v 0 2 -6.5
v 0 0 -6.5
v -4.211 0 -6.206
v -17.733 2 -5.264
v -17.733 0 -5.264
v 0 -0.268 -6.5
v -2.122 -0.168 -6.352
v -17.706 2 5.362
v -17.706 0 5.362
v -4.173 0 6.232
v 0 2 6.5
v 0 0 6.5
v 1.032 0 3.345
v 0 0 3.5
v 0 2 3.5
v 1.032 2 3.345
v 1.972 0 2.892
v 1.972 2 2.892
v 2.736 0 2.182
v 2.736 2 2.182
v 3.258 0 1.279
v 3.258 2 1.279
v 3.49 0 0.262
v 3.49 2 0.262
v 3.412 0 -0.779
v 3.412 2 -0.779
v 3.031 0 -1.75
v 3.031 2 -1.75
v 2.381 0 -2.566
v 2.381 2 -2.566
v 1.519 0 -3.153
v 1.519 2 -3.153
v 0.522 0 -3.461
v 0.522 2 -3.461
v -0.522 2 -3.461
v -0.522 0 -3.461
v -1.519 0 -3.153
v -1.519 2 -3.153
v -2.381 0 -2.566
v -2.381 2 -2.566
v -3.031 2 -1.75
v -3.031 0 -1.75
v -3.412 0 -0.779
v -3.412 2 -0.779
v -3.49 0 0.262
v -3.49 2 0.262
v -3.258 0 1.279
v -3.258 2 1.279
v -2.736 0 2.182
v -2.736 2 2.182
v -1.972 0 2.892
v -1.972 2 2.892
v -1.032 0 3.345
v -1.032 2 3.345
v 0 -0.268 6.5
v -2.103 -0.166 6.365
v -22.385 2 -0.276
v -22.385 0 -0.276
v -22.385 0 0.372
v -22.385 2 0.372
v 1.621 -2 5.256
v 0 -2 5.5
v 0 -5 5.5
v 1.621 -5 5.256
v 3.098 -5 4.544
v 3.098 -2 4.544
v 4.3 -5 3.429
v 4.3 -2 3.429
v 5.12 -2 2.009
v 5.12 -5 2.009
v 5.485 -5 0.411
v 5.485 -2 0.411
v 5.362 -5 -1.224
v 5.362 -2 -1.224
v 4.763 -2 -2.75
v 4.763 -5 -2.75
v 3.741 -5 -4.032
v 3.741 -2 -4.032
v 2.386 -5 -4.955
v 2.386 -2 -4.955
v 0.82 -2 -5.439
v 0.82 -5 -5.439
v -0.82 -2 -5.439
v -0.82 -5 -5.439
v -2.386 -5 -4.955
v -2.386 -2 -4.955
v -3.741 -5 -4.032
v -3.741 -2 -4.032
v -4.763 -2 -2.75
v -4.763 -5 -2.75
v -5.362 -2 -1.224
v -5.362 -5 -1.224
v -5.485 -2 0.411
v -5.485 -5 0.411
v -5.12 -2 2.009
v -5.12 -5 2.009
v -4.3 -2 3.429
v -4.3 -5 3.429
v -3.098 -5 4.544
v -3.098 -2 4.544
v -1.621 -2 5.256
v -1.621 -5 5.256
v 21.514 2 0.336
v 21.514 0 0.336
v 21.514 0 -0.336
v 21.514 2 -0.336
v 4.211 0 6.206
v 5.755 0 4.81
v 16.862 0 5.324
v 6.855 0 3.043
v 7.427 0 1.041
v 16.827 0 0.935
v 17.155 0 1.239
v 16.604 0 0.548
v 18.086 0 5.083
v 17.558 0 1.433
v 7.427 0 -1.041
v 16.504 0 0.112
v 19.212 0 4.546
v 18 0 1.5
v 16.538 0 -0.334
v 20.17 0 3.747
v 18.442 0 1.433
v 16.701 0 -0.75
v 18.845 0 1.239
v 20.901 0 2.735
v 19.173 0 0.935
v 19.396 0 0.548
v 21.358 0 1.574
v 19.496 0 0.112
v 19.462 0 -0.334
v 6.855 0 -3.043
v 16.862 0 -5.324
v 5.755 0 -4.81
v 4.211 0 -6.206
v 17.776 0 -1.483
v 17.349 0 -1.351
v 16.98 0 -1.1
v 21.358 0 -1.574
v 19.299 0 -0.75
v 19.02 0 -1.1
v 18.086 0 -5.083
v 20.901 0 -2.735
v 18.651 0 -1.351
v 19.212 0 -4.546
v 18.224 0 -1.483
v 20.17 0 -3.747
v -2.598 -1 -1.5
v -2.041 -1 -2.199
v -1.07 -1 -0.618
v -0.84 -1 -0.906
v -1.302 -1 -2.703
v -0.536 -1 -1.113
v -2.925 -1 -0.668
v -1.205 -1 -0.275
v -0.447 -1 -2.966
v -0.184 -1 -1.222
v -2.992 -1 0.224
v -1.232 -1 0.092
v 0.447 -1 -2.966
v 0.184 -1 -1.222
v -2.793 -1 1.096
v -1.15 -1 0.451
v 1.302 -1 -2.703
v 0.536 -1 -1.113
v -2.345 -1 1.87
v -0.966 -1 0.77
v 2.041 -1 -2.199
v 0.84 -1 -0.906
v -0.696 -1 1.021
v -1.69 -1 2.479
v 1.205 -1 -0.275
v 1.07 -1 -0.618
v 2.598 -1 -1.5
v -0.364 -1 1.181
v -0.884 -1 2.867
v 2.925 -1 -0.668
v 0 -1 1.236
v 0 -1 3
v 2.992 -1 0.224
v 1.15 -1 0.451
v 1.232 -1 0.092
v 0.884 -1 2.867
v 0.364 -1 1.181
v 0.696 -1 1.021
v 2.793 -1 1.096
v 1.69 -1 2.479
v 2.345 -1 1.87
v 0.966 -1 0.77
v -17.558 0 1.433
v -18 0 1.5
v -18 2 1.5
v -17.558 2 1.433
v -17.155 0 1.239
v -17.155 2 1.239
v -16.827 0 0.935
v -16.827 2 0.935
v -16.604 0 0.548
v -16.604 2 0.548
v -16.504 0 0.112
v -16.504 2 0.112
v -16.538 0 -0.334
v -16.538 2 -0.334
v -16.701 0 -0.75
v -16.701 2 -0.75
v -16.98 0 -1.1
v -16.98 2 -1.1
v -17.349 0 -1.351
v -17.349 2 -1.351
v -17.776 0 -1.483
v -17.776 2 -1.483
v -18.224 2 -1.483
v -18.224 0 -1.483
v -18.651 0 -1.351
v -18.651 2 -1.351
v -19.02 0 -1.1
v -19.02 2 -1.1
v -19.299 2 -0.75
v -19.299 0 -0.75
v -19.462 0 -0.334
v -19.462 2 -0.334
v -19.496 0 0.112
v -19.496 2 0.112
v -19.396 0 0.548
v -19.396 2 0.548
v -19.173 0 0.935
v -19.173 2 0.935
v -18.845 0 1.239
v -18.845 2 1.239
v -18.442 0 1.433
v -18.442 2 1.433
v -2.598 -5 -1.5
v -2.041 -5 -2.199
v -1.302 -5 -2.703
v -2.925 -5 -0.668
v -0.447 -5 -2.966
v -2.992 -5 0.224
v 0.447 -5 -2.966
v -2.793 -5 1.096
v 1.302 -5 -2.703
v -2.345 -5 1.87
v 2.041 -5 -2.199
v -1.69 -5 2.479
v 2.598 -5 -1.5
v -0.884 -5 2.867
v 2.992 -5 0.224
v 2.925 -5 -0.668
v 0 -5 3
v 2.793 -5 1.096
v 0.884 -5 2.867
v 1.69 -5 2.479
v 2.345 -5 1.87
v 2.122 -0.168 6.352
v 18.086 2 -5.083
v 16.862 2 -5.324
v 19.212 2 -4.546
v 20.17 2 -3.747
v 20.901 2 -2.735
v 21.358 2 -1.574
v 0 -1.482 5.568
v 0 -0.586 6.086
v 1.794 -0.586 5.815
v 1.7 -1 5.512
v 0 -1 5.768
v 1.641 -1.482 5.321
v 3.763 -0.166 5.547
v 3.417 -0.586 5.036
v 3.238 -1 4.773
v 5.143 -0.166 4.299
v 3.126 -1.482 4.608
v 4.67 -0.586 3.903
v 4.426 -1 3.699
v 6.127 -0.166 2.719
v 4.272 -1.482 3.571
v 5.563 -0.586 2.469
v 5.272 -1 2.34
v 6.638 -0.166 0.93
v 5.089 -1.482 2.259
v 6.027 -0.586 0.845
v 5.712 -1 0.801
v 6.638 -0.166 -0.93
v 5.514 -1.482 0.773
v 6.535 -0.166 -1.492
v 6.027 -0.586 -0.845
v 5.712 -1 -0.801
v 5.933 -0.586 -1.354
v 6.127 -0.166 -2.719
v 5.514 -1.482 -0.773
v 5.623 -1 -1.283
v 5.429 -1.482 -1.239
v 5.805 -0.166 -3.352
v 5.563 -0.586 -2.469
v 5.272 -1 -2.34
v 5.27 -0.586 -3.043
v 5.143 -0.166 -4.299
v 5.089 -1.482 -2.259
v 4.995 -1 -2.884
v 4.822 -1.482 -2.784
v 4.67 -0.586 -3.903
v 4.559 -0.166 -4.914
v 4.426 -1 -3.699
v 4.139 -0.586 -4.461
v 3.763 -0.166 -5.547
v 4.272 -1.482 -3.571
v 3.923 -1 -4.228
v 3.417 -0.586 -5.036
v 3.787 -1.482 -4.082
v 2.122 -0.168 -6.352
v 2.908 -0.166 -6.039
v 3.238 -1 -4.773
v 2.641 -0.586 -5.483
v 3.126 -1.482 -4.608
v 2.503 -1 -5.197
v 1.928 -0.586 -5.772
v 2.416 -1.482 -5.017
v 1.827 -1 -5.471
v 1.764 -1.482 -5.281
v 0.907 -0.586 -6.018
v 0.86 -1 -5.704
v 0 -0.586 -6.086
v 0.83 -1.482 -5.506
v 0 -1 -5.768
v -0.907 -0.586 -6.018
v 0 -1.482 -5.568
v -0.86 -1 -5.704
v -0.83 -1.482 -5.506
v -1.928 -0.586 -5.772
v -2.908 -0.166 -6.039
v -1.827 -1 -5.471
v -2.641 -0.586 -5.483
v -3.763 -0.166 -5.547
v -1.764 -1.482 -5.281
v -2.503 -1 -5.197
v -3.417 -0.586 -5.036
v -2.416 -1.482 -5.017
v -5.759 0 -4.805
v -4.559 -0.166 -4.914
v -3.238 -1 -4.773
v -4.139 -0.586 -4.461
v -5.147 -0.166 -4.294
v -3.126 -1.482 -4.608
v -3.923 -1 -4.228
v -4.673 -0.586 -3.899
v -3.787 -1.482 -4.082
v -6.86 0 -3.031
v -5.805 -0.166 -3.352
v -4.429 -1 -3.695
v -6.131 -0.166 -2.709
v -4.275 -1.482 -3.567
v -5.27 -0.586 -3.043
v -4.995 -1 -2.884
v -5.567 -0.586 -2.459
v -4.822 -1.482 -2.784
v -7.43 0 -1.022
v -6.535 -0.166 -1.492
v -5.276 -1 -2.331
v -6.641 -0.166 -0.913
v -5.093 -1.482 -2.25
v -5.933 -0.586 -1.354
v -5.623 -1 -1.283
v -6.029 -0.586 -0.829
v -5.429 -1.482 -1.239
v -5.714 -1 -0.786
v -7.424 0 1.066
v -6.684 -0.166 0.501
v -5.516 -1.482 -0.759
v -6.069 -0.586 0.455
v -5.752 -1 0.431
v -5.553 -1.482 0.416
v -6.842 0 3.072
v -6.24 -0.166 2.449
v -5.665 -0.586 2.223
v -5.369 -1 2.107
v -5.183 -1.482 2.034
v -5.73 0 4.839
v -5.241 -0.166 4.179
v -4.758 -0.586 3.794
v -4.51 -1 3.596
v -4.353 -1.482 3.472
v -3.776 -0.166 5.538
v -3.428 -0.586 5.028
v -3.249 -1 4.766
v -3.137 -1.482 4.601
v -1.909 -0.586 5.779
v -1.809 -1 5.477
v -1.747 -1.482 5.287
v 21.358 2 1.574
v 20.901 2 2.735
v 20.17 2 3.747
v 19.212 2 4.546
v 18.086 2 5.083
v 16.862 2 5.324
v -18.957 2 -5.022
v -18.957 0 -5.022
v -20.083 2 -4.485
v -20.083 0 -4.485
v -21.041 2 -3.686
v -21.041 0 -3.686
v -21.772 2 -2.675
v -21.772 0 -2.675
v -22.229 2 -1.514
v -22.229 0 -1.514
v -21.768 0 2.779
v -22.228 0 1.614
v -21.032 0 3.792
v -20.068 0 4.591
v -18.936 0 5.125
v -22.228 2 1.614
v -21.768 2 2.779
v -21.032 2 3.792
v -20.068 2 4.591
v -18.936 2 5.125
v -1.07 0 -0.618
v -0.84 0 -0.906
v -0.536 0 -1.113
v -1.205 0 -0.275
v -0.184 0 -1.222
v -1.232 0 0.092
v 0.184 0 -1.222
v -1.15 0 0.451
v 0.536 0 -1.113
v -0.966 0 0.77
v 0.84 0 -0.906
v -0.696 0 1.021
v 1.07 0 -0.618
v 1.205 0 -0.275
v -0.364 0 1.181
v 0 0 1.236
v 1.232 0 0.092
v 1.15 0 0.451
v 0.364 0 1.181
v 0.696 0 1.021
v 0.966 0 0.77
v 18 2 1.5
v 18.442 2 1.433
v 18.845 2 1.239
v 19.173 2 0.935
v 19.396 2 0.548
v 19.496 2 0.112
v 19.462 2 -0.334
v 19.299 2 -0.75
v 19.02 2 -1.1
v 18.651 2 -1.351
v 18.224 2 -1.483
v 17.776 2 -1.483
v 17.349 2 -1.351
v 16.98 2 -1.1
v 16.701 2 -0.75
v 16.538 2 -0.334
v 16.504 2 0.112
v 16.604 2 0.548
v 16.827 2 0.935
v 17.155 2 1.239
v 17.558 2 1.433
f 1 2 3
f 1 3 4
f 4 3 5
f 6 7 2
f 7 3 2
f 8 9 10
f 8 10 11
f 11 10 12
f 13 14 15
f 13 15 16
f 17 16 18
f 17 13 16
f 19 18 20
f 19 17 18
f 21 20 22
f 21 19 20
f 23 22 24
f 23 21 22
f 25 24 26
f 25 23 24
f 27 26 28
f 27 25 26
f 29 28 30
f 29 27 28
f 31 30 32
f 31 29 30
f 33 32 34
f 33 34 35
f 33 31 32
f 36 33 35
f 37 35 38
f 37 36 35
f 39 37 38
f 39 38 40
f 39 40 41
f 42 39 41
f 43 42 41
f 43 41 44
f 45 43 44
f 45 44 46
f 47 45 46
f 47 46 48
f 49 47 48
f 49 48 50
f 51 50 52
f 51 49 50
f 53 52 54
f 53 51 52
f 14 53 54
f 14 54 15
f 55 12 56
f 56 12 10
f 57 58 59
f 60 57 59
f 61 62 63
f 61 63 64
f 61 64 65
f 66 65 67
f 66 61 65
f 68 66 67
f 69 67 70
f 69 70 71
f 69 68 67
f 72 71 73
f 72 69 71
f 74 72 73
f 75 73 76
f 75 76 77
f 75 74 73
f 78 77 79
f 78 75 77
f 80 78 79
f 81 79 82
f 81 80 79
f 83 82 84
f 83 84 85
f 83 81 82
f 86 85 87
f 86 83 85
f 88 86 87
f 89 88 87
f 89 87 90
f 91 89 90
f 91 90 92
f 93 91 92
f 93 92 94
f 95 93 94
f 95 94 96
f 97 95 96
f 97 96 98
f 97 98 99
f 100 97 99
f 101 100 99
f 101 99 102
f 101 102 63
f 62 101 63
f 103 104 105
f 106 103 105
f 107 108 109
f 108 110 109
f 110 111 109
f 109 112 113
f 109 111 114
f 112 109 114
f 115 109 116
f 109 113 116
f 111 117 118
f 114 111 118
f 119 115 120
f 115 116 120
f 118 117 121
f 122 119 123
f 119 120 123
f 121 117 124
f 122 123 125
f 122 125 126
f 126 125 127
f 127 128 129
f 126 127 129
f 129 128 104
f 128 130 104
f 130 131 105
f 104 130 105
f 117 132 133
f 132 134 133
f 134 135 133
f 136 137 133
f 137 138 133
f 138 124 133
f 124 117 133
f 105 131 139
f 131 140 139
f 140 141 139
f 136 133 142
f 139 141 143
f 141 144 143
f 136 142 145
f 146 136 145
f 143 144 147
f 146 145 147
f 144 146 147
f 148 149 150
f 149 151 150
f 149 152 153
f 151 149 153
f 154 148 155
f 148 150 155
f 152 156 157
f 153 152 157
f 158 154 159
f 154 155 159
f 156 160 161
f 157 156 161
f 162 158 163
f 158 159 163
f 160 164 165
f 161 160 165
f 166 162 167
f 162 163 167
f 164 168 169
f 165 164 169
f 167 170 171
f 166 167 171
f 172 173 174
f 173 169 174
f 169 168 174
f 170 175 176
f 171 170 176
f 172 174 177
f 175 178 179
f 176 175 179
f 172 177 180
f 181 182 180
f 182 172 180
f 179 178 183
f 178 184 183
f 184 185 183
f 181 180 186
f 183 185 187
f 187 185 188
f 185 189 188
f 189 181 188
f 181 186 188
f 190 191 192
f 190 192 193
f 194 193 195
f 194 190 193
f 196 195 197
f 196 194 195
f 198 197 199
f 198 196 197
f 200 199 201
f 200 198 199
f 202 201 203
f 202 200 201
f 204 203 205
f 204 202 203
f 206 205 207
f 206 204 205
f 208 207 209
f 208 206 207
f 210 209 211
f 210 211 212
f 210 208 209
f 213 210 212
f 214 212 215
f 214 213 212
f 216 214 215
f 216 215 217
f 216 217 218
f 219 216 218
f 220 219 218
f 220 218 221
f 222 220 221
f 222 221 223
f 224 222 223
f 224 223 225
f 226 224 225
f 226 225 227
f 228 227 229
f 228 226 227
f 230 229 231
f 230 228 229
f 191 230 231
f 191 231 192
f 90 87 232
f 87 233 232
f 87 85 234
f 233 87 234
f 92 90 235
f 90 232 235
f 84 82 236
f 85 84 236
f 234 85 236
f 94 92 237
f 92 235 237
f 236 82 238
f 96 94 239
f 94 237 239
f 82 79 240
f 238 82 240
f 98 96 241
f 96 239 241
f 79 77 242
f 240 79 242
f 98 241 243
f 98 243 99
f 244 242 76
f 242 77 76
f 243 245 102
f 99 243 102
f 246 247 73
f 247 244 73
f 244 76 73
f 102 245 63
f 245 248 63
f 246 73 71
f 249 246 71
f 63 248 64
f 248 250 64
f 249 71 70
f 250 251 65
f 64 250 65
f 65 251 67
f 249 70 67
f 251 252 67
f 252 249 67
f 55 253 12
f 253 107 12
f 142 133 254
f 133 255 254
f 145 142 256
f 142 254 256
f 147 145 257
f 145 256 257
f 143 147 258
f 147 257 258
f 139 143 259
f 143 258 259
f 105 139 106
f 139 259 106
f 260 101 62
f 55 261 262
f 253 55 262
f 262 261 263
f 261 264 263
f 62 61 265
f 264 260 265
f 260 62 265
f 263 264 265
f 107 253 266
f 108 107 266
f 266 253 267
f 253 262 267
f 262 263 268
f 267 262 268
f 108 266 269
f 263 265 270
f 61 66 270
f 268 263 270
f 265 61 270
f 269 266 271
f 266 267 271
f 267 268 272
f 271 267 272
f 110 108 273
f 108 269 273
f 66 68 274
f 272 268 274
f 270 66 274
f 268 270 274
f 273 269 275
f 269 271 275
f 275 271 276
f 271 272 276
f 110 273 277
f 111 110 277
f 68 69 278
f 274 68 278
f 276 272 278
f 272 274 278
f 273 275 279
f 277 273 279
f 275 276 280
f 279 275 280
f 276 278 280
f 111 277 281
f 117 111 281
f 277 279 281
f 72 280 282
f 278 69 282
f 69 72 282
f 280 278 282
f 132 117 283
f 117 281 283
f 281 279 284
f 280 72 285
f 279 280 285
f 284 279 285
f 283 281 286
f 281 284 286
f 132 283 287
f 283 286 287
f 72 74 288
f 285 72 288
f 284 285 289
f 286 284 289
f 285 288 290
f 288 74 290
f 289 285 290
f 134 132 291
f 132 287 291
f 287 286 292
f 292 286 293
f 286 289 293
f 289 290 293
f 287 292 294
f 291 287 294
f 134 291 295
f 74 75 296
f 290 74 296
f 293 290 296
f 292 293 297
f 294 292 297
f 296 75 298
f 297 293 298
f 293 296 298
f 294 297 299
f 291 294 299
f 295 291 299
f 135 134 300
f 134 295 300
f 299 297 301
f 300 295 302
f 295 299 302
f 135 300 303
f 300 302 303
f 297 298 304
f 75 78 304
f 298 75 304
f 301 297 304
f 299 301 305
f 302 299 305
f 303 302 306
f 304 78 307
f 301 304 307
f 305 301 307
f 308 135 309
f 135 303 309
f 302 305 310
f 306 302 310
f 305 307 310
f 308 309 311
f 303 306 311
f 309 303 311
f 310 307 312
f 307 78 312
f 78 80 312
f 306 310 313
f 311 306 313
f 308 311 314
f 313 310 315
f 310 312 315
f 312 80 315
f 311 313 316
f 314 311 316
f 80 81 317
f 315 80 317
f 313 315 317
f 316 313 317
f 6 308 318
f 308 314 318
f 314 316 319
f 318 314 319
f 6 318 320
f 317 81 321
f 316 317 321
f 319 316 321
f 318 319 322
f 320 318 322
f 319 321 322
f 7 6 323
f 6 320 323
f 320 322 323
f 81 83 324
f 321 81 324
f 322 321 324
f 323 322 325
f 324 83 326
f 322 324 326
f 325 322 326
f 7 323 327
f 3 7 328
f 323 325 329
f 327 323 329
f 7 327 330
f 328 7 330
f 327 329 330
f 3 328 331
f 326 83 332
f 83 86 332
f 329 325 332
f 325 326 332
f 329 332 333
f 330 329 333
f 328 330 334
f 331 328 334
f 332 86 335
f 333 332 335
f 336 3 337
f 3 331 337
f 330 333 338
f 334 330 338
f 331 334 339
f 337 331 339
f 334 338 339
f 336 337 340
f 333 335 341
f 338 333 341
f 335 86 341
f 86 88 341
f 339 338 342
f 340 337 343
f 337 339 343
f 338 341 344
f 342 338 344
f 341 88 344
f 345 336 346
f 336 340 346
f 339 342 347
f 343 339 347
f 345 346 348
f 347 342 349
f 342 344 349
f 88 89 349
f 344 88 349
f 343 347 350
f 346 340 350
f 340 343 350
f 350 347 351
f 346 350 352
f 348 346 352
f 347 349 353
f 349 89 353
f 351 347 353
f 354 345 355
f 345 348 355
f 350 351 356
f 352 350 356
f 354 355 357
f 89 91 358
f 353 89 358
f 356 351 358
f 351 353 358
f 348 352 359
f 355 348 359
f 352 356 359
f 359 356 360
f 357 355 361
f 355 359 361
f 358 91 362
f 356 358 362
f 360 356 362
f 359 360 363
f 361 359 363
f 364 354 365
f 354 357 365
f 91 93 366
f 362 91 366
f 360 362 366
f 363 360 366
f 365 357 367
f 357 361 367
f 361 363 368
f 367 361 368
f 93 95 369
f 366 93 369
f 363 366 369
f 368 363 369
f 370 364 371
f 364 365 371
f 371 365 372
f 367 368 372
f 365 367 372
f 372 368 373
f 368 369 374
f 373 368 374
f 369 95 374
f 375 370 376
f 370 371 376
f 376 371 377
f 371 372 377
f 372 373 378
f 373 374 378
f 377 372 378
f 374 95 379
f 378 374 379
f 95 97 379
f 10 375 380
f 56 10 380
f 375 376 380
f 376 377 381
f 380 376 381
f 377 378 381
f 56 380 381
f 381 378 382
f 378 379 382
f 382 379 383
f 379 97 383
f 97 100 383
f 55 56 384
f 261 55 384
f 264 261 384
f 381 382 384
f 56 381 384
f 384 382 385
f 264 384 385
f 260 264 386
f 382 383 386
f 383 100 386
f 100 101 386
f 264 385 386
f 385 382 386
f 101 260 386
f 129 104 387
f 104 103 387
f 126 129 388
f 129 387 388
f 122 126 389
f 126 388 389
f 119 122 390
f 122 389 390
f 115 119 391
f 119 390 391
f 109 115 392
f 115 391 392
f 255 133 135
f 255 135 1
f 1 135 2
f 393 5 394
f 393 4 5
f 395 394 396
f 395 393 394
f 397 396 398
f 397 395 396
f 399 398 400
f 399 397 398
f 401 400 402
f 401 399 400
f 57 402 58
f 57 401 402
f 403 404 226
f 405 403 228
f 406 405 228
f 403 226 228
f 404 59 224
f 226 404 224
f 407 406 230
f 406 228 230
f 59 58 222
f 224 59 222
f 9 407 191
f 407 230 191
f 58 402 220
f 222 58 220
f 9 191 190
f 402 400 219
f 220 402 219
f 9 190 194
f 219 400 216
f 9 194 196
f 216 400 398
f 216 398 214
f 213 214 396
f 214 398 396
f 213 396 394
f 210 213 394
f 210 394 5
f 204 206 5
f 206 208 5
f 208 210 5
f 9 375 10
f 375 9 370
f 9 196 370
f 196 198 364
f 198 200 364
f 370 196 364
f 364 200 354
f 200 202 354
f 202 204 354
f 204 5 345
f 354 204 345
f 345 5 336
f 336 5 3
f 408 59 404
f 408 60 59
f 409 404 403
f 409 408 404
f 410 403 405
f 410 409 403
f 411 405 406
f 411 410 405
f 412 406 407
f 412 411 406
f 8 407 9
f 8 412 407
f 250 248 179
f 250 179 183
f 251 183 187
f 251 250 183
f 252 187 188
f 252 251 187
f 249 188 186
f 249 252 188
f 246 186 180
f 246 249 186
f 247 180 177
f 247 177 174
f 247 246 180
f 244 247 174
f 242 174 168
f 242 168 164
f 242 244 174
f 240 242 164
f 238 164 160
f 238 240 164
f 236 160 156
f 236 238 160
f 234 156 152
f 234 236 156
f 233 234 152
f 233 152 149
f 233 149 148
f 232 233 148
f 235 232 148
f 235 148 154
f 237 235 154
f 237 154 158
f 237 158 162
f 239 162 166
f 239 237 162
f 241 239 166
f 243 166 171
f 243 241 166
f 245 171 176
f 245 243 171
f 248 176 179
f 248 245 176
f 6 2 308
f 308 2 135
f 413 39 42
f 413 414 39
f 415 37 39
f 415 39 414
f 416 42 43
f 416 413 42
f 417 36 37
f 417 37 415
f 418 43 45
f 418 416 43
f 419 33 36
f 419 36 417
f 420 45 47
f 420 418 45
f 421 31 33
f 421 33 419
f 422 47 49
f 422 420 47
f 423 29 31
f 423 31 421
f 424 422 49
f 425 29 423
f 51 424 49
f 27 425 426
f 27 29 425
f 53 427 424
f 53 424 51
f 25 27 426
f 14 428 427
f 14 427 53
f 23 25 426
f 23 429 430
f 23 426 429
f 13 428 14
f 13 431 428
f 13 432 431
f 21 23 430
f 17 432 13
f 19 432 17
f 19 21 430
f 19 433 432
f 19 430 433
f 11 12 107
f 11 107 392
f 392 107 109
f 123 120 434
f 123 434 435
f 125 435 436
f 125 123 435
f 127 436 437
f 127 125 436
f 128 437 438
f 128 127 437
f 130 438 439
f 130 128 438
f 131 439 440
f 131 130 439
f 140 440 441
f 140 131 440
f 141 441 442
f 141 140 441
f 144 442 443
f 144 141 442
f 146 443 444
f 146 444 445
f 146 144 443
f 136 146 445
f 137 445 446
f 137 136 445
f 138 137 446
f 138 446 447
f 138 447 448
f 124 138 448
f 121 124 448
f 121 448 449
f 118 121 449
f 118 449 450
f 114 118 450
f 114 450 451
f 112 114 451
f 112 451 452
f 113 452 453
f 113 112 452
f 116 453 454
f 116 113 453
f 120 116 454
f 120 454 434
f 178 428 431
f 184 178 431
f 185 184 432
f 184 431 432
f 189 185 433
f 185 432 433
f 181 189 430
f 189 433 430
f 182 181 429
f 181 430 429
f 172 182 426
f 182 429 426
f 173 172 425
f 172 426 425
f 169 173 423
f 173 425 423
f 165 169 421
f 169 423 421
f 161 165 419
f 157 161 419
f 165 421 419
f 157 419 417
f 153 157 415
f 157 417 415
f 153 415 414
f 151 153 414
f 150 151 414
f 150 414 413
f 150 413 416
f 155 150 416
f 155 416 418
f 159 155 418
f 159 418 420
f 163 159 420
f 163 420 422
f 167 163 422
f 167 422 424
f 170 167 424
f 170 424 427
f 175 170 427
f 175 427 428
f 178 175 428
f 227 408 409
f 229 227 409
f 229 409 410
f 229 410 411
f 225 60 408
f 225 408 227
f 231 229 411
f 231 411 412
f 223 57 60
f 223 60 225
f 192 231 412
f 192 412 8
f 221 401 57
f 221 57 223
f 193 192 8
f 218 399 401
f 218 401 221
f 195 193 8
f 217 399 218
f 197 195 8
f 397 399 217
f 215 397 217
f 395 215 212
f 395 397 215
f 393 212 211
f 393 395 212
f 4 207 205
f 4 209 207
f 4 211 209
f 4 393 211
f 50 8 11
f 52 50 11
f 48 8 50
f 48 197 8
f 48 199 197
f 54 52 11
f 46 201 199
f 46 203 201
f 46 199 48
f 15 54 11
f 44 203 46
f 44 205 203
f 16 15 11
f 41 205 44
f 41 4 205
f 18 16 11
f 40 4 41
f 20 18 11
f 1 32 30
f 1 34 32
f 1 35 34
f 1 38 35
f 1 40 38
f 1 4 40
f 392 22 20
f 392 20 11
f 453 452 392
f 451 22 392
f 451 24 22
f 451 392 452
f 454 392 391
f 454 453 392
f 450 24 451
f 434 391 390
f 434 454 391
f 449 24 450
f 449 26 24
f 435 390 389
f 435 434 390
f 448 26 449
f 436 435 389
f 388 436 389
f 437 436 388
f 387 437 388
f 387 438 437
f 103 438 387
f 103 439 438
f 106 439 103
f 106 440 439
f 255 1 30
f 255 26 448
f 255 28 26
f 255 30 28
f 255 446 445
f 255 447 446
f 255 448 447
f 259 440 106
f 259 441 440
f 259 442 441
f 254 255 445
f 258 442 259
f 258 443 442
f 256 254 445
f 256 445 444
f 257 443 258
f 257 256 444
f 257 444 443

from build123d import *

# Parameters (mm, degrees)
SKETCH1_R           = 3.5
SKETCH1_R_2         = 1.5
BOSS_EXTRUDE1_DEPTH = 2
FILLET2_R           = 5
SKETCH2_R           = 5.5
SKETCH2_R_2         = 1.235500329
BOSS_EXTRUDE2_DEPTH = 5
FILLET3_R           = 2
CUT_EXTRUDE1_START  = -5
SKETCH3_R           = 3
CUT_EXTRUDE1_DEPTH  = 4


with BuildPart() as part:
    # Sketch1 → Boss-Extrude1 (new body)
    with BuildSketch(Plane(origin=(0, 0, 0), x_dir=(1, 0, 0), z_dir=(0, 1, 0))):
        Polygon((0, 6.5), (-22.384997637, 4.939274727), (-22.384997637, -5.060725273), (0, -6.5), (21.514033914, -5), (21.514033914, 5), align=None)
        with Locations(Location((0, 0, 0), (0, 0, 270))):
            Circle(SKETCH1_R, mode=Mode.SUBTRACT)
        with Locations(Location((-18, 0, 0), (0, 0, 270))):
            Circle(SKETCH1_R_2, mode=Mode.SUBTRACT)
        with Locations(Location((18, 0, 0), (0, 0, 270))):
            Circle(SKETCH1_R_2, mode=Mode.SUBTRACT)
    extrude(amount=BOSS_EXTRUDE1_DEPTH)

    # Fillet2
    fillet2_edges = [part.edges().sort_by_distance(p)[0] for p in [
        (-22.384997637, 1, 5.060725273),
        (-22.384997637, 1, -4.939274727),
        (21.514033914, 1, -5),
        (21.514033914, 1, 5),
    ]]
    fillet(fillet2_edges, radius=FILLET2_R)

    # Sketch2 → Boss-Extrude2 (add)
    with BuildSketch(Plane(origin=(0, 0, 0), x_dir=(1, 0, 0), z_dir=(0, 1, 0))):
        with Locations(Location((0, 0, 0), (0, 0, 270))):
            Circle(SKETCH2_R)
        with Locations(Location((0, 0, 0), (0, 0, 270))):
            Circle(SKETCH2_R_2, mode=Mode.SUBTRACT)
    extrude(amount=-BOSS_EXTRUDE2_DEPTH)

    # Fillet3
    # the kernel refuses this fillet: 2 mm, written as the material it adds along each edge
    with BuildSketch(Plane(origin=(0, 0, 0), x_dir=(0, 0, 1), z_dir=(-1, 0, 0))) as fillet3_piece_1_section:
        with BuildLine():
            CenterArc((5.5 + FILLET3_R, -FILLET3_R), FILLET3_R, 90, 90)
            Line((5.5, -FILLET3_R), (5.5, 0))
            Line((5.5, 0), (5.5 + FILLET3_R, 0))
        make_face()
    fillet3_piece_1 = revolve(axis=Axis((0, 0, 0), (0, 1, 0)), mode=Mode.PRIVATE)
    fillet3_piece_1 = split(fillet3_piece_1, bisect_by=Plane(origin=(-0.030373147, -0.562249721, -6.497882326), z_dir=(0.06955308260096395, 0, 0.9975782519184666)), keep=Keep.TOP, mode=Mode.PRIVATE)
    fillet3_piece_1 = split(fillet3_piece_1, bisect_by=Plane(origin=(0.030373147, -0.562249721, -6.497882326), z_dir=(-0.06955308260096384, 0, 0.9975782519184666)), keep=Keep.TOP, mode=Mode.PRIVATE)
    fillet3_piece_1 = split(fillet3_piece_1, bisect_by=Plane(origin=(-0.804382076, -0.562249721, 6.44828113), z_dir=(0.06416390756024656, 0, -0.9979393733922919)), keep=Keep.TOP, mode=Mode.PRIVATE)
    fillet3_piece_1 = split(fillet3_piece_1, bisect_by=Plane(origin=(0.871627207, -0.562249721, 6.439228468), z_dir=(-0.06955308260096384, 0, -0.9975782519184666)), keep=Keep.TOP, mode=Mode.PRIVATE)
    add(fillet3_piece_1)

    # Sketch3 → Cut-Extrude1 (cut)
    with BuildSketch(Plane(origin=(0, 0, 0), x_dir=(1, 0, 0), z_dir=(0, 1, 0)).offset(CUT_EXTRUDE1_START)):
        with Locations(Location((0, 0, 0), (0, 0, 270))):
            Circle(SKETCH3_R)
    extrude(amount=CUT_EXTRUDE1_DEPTH, mode=Mode.SUBTRACT)


solid = part.part
